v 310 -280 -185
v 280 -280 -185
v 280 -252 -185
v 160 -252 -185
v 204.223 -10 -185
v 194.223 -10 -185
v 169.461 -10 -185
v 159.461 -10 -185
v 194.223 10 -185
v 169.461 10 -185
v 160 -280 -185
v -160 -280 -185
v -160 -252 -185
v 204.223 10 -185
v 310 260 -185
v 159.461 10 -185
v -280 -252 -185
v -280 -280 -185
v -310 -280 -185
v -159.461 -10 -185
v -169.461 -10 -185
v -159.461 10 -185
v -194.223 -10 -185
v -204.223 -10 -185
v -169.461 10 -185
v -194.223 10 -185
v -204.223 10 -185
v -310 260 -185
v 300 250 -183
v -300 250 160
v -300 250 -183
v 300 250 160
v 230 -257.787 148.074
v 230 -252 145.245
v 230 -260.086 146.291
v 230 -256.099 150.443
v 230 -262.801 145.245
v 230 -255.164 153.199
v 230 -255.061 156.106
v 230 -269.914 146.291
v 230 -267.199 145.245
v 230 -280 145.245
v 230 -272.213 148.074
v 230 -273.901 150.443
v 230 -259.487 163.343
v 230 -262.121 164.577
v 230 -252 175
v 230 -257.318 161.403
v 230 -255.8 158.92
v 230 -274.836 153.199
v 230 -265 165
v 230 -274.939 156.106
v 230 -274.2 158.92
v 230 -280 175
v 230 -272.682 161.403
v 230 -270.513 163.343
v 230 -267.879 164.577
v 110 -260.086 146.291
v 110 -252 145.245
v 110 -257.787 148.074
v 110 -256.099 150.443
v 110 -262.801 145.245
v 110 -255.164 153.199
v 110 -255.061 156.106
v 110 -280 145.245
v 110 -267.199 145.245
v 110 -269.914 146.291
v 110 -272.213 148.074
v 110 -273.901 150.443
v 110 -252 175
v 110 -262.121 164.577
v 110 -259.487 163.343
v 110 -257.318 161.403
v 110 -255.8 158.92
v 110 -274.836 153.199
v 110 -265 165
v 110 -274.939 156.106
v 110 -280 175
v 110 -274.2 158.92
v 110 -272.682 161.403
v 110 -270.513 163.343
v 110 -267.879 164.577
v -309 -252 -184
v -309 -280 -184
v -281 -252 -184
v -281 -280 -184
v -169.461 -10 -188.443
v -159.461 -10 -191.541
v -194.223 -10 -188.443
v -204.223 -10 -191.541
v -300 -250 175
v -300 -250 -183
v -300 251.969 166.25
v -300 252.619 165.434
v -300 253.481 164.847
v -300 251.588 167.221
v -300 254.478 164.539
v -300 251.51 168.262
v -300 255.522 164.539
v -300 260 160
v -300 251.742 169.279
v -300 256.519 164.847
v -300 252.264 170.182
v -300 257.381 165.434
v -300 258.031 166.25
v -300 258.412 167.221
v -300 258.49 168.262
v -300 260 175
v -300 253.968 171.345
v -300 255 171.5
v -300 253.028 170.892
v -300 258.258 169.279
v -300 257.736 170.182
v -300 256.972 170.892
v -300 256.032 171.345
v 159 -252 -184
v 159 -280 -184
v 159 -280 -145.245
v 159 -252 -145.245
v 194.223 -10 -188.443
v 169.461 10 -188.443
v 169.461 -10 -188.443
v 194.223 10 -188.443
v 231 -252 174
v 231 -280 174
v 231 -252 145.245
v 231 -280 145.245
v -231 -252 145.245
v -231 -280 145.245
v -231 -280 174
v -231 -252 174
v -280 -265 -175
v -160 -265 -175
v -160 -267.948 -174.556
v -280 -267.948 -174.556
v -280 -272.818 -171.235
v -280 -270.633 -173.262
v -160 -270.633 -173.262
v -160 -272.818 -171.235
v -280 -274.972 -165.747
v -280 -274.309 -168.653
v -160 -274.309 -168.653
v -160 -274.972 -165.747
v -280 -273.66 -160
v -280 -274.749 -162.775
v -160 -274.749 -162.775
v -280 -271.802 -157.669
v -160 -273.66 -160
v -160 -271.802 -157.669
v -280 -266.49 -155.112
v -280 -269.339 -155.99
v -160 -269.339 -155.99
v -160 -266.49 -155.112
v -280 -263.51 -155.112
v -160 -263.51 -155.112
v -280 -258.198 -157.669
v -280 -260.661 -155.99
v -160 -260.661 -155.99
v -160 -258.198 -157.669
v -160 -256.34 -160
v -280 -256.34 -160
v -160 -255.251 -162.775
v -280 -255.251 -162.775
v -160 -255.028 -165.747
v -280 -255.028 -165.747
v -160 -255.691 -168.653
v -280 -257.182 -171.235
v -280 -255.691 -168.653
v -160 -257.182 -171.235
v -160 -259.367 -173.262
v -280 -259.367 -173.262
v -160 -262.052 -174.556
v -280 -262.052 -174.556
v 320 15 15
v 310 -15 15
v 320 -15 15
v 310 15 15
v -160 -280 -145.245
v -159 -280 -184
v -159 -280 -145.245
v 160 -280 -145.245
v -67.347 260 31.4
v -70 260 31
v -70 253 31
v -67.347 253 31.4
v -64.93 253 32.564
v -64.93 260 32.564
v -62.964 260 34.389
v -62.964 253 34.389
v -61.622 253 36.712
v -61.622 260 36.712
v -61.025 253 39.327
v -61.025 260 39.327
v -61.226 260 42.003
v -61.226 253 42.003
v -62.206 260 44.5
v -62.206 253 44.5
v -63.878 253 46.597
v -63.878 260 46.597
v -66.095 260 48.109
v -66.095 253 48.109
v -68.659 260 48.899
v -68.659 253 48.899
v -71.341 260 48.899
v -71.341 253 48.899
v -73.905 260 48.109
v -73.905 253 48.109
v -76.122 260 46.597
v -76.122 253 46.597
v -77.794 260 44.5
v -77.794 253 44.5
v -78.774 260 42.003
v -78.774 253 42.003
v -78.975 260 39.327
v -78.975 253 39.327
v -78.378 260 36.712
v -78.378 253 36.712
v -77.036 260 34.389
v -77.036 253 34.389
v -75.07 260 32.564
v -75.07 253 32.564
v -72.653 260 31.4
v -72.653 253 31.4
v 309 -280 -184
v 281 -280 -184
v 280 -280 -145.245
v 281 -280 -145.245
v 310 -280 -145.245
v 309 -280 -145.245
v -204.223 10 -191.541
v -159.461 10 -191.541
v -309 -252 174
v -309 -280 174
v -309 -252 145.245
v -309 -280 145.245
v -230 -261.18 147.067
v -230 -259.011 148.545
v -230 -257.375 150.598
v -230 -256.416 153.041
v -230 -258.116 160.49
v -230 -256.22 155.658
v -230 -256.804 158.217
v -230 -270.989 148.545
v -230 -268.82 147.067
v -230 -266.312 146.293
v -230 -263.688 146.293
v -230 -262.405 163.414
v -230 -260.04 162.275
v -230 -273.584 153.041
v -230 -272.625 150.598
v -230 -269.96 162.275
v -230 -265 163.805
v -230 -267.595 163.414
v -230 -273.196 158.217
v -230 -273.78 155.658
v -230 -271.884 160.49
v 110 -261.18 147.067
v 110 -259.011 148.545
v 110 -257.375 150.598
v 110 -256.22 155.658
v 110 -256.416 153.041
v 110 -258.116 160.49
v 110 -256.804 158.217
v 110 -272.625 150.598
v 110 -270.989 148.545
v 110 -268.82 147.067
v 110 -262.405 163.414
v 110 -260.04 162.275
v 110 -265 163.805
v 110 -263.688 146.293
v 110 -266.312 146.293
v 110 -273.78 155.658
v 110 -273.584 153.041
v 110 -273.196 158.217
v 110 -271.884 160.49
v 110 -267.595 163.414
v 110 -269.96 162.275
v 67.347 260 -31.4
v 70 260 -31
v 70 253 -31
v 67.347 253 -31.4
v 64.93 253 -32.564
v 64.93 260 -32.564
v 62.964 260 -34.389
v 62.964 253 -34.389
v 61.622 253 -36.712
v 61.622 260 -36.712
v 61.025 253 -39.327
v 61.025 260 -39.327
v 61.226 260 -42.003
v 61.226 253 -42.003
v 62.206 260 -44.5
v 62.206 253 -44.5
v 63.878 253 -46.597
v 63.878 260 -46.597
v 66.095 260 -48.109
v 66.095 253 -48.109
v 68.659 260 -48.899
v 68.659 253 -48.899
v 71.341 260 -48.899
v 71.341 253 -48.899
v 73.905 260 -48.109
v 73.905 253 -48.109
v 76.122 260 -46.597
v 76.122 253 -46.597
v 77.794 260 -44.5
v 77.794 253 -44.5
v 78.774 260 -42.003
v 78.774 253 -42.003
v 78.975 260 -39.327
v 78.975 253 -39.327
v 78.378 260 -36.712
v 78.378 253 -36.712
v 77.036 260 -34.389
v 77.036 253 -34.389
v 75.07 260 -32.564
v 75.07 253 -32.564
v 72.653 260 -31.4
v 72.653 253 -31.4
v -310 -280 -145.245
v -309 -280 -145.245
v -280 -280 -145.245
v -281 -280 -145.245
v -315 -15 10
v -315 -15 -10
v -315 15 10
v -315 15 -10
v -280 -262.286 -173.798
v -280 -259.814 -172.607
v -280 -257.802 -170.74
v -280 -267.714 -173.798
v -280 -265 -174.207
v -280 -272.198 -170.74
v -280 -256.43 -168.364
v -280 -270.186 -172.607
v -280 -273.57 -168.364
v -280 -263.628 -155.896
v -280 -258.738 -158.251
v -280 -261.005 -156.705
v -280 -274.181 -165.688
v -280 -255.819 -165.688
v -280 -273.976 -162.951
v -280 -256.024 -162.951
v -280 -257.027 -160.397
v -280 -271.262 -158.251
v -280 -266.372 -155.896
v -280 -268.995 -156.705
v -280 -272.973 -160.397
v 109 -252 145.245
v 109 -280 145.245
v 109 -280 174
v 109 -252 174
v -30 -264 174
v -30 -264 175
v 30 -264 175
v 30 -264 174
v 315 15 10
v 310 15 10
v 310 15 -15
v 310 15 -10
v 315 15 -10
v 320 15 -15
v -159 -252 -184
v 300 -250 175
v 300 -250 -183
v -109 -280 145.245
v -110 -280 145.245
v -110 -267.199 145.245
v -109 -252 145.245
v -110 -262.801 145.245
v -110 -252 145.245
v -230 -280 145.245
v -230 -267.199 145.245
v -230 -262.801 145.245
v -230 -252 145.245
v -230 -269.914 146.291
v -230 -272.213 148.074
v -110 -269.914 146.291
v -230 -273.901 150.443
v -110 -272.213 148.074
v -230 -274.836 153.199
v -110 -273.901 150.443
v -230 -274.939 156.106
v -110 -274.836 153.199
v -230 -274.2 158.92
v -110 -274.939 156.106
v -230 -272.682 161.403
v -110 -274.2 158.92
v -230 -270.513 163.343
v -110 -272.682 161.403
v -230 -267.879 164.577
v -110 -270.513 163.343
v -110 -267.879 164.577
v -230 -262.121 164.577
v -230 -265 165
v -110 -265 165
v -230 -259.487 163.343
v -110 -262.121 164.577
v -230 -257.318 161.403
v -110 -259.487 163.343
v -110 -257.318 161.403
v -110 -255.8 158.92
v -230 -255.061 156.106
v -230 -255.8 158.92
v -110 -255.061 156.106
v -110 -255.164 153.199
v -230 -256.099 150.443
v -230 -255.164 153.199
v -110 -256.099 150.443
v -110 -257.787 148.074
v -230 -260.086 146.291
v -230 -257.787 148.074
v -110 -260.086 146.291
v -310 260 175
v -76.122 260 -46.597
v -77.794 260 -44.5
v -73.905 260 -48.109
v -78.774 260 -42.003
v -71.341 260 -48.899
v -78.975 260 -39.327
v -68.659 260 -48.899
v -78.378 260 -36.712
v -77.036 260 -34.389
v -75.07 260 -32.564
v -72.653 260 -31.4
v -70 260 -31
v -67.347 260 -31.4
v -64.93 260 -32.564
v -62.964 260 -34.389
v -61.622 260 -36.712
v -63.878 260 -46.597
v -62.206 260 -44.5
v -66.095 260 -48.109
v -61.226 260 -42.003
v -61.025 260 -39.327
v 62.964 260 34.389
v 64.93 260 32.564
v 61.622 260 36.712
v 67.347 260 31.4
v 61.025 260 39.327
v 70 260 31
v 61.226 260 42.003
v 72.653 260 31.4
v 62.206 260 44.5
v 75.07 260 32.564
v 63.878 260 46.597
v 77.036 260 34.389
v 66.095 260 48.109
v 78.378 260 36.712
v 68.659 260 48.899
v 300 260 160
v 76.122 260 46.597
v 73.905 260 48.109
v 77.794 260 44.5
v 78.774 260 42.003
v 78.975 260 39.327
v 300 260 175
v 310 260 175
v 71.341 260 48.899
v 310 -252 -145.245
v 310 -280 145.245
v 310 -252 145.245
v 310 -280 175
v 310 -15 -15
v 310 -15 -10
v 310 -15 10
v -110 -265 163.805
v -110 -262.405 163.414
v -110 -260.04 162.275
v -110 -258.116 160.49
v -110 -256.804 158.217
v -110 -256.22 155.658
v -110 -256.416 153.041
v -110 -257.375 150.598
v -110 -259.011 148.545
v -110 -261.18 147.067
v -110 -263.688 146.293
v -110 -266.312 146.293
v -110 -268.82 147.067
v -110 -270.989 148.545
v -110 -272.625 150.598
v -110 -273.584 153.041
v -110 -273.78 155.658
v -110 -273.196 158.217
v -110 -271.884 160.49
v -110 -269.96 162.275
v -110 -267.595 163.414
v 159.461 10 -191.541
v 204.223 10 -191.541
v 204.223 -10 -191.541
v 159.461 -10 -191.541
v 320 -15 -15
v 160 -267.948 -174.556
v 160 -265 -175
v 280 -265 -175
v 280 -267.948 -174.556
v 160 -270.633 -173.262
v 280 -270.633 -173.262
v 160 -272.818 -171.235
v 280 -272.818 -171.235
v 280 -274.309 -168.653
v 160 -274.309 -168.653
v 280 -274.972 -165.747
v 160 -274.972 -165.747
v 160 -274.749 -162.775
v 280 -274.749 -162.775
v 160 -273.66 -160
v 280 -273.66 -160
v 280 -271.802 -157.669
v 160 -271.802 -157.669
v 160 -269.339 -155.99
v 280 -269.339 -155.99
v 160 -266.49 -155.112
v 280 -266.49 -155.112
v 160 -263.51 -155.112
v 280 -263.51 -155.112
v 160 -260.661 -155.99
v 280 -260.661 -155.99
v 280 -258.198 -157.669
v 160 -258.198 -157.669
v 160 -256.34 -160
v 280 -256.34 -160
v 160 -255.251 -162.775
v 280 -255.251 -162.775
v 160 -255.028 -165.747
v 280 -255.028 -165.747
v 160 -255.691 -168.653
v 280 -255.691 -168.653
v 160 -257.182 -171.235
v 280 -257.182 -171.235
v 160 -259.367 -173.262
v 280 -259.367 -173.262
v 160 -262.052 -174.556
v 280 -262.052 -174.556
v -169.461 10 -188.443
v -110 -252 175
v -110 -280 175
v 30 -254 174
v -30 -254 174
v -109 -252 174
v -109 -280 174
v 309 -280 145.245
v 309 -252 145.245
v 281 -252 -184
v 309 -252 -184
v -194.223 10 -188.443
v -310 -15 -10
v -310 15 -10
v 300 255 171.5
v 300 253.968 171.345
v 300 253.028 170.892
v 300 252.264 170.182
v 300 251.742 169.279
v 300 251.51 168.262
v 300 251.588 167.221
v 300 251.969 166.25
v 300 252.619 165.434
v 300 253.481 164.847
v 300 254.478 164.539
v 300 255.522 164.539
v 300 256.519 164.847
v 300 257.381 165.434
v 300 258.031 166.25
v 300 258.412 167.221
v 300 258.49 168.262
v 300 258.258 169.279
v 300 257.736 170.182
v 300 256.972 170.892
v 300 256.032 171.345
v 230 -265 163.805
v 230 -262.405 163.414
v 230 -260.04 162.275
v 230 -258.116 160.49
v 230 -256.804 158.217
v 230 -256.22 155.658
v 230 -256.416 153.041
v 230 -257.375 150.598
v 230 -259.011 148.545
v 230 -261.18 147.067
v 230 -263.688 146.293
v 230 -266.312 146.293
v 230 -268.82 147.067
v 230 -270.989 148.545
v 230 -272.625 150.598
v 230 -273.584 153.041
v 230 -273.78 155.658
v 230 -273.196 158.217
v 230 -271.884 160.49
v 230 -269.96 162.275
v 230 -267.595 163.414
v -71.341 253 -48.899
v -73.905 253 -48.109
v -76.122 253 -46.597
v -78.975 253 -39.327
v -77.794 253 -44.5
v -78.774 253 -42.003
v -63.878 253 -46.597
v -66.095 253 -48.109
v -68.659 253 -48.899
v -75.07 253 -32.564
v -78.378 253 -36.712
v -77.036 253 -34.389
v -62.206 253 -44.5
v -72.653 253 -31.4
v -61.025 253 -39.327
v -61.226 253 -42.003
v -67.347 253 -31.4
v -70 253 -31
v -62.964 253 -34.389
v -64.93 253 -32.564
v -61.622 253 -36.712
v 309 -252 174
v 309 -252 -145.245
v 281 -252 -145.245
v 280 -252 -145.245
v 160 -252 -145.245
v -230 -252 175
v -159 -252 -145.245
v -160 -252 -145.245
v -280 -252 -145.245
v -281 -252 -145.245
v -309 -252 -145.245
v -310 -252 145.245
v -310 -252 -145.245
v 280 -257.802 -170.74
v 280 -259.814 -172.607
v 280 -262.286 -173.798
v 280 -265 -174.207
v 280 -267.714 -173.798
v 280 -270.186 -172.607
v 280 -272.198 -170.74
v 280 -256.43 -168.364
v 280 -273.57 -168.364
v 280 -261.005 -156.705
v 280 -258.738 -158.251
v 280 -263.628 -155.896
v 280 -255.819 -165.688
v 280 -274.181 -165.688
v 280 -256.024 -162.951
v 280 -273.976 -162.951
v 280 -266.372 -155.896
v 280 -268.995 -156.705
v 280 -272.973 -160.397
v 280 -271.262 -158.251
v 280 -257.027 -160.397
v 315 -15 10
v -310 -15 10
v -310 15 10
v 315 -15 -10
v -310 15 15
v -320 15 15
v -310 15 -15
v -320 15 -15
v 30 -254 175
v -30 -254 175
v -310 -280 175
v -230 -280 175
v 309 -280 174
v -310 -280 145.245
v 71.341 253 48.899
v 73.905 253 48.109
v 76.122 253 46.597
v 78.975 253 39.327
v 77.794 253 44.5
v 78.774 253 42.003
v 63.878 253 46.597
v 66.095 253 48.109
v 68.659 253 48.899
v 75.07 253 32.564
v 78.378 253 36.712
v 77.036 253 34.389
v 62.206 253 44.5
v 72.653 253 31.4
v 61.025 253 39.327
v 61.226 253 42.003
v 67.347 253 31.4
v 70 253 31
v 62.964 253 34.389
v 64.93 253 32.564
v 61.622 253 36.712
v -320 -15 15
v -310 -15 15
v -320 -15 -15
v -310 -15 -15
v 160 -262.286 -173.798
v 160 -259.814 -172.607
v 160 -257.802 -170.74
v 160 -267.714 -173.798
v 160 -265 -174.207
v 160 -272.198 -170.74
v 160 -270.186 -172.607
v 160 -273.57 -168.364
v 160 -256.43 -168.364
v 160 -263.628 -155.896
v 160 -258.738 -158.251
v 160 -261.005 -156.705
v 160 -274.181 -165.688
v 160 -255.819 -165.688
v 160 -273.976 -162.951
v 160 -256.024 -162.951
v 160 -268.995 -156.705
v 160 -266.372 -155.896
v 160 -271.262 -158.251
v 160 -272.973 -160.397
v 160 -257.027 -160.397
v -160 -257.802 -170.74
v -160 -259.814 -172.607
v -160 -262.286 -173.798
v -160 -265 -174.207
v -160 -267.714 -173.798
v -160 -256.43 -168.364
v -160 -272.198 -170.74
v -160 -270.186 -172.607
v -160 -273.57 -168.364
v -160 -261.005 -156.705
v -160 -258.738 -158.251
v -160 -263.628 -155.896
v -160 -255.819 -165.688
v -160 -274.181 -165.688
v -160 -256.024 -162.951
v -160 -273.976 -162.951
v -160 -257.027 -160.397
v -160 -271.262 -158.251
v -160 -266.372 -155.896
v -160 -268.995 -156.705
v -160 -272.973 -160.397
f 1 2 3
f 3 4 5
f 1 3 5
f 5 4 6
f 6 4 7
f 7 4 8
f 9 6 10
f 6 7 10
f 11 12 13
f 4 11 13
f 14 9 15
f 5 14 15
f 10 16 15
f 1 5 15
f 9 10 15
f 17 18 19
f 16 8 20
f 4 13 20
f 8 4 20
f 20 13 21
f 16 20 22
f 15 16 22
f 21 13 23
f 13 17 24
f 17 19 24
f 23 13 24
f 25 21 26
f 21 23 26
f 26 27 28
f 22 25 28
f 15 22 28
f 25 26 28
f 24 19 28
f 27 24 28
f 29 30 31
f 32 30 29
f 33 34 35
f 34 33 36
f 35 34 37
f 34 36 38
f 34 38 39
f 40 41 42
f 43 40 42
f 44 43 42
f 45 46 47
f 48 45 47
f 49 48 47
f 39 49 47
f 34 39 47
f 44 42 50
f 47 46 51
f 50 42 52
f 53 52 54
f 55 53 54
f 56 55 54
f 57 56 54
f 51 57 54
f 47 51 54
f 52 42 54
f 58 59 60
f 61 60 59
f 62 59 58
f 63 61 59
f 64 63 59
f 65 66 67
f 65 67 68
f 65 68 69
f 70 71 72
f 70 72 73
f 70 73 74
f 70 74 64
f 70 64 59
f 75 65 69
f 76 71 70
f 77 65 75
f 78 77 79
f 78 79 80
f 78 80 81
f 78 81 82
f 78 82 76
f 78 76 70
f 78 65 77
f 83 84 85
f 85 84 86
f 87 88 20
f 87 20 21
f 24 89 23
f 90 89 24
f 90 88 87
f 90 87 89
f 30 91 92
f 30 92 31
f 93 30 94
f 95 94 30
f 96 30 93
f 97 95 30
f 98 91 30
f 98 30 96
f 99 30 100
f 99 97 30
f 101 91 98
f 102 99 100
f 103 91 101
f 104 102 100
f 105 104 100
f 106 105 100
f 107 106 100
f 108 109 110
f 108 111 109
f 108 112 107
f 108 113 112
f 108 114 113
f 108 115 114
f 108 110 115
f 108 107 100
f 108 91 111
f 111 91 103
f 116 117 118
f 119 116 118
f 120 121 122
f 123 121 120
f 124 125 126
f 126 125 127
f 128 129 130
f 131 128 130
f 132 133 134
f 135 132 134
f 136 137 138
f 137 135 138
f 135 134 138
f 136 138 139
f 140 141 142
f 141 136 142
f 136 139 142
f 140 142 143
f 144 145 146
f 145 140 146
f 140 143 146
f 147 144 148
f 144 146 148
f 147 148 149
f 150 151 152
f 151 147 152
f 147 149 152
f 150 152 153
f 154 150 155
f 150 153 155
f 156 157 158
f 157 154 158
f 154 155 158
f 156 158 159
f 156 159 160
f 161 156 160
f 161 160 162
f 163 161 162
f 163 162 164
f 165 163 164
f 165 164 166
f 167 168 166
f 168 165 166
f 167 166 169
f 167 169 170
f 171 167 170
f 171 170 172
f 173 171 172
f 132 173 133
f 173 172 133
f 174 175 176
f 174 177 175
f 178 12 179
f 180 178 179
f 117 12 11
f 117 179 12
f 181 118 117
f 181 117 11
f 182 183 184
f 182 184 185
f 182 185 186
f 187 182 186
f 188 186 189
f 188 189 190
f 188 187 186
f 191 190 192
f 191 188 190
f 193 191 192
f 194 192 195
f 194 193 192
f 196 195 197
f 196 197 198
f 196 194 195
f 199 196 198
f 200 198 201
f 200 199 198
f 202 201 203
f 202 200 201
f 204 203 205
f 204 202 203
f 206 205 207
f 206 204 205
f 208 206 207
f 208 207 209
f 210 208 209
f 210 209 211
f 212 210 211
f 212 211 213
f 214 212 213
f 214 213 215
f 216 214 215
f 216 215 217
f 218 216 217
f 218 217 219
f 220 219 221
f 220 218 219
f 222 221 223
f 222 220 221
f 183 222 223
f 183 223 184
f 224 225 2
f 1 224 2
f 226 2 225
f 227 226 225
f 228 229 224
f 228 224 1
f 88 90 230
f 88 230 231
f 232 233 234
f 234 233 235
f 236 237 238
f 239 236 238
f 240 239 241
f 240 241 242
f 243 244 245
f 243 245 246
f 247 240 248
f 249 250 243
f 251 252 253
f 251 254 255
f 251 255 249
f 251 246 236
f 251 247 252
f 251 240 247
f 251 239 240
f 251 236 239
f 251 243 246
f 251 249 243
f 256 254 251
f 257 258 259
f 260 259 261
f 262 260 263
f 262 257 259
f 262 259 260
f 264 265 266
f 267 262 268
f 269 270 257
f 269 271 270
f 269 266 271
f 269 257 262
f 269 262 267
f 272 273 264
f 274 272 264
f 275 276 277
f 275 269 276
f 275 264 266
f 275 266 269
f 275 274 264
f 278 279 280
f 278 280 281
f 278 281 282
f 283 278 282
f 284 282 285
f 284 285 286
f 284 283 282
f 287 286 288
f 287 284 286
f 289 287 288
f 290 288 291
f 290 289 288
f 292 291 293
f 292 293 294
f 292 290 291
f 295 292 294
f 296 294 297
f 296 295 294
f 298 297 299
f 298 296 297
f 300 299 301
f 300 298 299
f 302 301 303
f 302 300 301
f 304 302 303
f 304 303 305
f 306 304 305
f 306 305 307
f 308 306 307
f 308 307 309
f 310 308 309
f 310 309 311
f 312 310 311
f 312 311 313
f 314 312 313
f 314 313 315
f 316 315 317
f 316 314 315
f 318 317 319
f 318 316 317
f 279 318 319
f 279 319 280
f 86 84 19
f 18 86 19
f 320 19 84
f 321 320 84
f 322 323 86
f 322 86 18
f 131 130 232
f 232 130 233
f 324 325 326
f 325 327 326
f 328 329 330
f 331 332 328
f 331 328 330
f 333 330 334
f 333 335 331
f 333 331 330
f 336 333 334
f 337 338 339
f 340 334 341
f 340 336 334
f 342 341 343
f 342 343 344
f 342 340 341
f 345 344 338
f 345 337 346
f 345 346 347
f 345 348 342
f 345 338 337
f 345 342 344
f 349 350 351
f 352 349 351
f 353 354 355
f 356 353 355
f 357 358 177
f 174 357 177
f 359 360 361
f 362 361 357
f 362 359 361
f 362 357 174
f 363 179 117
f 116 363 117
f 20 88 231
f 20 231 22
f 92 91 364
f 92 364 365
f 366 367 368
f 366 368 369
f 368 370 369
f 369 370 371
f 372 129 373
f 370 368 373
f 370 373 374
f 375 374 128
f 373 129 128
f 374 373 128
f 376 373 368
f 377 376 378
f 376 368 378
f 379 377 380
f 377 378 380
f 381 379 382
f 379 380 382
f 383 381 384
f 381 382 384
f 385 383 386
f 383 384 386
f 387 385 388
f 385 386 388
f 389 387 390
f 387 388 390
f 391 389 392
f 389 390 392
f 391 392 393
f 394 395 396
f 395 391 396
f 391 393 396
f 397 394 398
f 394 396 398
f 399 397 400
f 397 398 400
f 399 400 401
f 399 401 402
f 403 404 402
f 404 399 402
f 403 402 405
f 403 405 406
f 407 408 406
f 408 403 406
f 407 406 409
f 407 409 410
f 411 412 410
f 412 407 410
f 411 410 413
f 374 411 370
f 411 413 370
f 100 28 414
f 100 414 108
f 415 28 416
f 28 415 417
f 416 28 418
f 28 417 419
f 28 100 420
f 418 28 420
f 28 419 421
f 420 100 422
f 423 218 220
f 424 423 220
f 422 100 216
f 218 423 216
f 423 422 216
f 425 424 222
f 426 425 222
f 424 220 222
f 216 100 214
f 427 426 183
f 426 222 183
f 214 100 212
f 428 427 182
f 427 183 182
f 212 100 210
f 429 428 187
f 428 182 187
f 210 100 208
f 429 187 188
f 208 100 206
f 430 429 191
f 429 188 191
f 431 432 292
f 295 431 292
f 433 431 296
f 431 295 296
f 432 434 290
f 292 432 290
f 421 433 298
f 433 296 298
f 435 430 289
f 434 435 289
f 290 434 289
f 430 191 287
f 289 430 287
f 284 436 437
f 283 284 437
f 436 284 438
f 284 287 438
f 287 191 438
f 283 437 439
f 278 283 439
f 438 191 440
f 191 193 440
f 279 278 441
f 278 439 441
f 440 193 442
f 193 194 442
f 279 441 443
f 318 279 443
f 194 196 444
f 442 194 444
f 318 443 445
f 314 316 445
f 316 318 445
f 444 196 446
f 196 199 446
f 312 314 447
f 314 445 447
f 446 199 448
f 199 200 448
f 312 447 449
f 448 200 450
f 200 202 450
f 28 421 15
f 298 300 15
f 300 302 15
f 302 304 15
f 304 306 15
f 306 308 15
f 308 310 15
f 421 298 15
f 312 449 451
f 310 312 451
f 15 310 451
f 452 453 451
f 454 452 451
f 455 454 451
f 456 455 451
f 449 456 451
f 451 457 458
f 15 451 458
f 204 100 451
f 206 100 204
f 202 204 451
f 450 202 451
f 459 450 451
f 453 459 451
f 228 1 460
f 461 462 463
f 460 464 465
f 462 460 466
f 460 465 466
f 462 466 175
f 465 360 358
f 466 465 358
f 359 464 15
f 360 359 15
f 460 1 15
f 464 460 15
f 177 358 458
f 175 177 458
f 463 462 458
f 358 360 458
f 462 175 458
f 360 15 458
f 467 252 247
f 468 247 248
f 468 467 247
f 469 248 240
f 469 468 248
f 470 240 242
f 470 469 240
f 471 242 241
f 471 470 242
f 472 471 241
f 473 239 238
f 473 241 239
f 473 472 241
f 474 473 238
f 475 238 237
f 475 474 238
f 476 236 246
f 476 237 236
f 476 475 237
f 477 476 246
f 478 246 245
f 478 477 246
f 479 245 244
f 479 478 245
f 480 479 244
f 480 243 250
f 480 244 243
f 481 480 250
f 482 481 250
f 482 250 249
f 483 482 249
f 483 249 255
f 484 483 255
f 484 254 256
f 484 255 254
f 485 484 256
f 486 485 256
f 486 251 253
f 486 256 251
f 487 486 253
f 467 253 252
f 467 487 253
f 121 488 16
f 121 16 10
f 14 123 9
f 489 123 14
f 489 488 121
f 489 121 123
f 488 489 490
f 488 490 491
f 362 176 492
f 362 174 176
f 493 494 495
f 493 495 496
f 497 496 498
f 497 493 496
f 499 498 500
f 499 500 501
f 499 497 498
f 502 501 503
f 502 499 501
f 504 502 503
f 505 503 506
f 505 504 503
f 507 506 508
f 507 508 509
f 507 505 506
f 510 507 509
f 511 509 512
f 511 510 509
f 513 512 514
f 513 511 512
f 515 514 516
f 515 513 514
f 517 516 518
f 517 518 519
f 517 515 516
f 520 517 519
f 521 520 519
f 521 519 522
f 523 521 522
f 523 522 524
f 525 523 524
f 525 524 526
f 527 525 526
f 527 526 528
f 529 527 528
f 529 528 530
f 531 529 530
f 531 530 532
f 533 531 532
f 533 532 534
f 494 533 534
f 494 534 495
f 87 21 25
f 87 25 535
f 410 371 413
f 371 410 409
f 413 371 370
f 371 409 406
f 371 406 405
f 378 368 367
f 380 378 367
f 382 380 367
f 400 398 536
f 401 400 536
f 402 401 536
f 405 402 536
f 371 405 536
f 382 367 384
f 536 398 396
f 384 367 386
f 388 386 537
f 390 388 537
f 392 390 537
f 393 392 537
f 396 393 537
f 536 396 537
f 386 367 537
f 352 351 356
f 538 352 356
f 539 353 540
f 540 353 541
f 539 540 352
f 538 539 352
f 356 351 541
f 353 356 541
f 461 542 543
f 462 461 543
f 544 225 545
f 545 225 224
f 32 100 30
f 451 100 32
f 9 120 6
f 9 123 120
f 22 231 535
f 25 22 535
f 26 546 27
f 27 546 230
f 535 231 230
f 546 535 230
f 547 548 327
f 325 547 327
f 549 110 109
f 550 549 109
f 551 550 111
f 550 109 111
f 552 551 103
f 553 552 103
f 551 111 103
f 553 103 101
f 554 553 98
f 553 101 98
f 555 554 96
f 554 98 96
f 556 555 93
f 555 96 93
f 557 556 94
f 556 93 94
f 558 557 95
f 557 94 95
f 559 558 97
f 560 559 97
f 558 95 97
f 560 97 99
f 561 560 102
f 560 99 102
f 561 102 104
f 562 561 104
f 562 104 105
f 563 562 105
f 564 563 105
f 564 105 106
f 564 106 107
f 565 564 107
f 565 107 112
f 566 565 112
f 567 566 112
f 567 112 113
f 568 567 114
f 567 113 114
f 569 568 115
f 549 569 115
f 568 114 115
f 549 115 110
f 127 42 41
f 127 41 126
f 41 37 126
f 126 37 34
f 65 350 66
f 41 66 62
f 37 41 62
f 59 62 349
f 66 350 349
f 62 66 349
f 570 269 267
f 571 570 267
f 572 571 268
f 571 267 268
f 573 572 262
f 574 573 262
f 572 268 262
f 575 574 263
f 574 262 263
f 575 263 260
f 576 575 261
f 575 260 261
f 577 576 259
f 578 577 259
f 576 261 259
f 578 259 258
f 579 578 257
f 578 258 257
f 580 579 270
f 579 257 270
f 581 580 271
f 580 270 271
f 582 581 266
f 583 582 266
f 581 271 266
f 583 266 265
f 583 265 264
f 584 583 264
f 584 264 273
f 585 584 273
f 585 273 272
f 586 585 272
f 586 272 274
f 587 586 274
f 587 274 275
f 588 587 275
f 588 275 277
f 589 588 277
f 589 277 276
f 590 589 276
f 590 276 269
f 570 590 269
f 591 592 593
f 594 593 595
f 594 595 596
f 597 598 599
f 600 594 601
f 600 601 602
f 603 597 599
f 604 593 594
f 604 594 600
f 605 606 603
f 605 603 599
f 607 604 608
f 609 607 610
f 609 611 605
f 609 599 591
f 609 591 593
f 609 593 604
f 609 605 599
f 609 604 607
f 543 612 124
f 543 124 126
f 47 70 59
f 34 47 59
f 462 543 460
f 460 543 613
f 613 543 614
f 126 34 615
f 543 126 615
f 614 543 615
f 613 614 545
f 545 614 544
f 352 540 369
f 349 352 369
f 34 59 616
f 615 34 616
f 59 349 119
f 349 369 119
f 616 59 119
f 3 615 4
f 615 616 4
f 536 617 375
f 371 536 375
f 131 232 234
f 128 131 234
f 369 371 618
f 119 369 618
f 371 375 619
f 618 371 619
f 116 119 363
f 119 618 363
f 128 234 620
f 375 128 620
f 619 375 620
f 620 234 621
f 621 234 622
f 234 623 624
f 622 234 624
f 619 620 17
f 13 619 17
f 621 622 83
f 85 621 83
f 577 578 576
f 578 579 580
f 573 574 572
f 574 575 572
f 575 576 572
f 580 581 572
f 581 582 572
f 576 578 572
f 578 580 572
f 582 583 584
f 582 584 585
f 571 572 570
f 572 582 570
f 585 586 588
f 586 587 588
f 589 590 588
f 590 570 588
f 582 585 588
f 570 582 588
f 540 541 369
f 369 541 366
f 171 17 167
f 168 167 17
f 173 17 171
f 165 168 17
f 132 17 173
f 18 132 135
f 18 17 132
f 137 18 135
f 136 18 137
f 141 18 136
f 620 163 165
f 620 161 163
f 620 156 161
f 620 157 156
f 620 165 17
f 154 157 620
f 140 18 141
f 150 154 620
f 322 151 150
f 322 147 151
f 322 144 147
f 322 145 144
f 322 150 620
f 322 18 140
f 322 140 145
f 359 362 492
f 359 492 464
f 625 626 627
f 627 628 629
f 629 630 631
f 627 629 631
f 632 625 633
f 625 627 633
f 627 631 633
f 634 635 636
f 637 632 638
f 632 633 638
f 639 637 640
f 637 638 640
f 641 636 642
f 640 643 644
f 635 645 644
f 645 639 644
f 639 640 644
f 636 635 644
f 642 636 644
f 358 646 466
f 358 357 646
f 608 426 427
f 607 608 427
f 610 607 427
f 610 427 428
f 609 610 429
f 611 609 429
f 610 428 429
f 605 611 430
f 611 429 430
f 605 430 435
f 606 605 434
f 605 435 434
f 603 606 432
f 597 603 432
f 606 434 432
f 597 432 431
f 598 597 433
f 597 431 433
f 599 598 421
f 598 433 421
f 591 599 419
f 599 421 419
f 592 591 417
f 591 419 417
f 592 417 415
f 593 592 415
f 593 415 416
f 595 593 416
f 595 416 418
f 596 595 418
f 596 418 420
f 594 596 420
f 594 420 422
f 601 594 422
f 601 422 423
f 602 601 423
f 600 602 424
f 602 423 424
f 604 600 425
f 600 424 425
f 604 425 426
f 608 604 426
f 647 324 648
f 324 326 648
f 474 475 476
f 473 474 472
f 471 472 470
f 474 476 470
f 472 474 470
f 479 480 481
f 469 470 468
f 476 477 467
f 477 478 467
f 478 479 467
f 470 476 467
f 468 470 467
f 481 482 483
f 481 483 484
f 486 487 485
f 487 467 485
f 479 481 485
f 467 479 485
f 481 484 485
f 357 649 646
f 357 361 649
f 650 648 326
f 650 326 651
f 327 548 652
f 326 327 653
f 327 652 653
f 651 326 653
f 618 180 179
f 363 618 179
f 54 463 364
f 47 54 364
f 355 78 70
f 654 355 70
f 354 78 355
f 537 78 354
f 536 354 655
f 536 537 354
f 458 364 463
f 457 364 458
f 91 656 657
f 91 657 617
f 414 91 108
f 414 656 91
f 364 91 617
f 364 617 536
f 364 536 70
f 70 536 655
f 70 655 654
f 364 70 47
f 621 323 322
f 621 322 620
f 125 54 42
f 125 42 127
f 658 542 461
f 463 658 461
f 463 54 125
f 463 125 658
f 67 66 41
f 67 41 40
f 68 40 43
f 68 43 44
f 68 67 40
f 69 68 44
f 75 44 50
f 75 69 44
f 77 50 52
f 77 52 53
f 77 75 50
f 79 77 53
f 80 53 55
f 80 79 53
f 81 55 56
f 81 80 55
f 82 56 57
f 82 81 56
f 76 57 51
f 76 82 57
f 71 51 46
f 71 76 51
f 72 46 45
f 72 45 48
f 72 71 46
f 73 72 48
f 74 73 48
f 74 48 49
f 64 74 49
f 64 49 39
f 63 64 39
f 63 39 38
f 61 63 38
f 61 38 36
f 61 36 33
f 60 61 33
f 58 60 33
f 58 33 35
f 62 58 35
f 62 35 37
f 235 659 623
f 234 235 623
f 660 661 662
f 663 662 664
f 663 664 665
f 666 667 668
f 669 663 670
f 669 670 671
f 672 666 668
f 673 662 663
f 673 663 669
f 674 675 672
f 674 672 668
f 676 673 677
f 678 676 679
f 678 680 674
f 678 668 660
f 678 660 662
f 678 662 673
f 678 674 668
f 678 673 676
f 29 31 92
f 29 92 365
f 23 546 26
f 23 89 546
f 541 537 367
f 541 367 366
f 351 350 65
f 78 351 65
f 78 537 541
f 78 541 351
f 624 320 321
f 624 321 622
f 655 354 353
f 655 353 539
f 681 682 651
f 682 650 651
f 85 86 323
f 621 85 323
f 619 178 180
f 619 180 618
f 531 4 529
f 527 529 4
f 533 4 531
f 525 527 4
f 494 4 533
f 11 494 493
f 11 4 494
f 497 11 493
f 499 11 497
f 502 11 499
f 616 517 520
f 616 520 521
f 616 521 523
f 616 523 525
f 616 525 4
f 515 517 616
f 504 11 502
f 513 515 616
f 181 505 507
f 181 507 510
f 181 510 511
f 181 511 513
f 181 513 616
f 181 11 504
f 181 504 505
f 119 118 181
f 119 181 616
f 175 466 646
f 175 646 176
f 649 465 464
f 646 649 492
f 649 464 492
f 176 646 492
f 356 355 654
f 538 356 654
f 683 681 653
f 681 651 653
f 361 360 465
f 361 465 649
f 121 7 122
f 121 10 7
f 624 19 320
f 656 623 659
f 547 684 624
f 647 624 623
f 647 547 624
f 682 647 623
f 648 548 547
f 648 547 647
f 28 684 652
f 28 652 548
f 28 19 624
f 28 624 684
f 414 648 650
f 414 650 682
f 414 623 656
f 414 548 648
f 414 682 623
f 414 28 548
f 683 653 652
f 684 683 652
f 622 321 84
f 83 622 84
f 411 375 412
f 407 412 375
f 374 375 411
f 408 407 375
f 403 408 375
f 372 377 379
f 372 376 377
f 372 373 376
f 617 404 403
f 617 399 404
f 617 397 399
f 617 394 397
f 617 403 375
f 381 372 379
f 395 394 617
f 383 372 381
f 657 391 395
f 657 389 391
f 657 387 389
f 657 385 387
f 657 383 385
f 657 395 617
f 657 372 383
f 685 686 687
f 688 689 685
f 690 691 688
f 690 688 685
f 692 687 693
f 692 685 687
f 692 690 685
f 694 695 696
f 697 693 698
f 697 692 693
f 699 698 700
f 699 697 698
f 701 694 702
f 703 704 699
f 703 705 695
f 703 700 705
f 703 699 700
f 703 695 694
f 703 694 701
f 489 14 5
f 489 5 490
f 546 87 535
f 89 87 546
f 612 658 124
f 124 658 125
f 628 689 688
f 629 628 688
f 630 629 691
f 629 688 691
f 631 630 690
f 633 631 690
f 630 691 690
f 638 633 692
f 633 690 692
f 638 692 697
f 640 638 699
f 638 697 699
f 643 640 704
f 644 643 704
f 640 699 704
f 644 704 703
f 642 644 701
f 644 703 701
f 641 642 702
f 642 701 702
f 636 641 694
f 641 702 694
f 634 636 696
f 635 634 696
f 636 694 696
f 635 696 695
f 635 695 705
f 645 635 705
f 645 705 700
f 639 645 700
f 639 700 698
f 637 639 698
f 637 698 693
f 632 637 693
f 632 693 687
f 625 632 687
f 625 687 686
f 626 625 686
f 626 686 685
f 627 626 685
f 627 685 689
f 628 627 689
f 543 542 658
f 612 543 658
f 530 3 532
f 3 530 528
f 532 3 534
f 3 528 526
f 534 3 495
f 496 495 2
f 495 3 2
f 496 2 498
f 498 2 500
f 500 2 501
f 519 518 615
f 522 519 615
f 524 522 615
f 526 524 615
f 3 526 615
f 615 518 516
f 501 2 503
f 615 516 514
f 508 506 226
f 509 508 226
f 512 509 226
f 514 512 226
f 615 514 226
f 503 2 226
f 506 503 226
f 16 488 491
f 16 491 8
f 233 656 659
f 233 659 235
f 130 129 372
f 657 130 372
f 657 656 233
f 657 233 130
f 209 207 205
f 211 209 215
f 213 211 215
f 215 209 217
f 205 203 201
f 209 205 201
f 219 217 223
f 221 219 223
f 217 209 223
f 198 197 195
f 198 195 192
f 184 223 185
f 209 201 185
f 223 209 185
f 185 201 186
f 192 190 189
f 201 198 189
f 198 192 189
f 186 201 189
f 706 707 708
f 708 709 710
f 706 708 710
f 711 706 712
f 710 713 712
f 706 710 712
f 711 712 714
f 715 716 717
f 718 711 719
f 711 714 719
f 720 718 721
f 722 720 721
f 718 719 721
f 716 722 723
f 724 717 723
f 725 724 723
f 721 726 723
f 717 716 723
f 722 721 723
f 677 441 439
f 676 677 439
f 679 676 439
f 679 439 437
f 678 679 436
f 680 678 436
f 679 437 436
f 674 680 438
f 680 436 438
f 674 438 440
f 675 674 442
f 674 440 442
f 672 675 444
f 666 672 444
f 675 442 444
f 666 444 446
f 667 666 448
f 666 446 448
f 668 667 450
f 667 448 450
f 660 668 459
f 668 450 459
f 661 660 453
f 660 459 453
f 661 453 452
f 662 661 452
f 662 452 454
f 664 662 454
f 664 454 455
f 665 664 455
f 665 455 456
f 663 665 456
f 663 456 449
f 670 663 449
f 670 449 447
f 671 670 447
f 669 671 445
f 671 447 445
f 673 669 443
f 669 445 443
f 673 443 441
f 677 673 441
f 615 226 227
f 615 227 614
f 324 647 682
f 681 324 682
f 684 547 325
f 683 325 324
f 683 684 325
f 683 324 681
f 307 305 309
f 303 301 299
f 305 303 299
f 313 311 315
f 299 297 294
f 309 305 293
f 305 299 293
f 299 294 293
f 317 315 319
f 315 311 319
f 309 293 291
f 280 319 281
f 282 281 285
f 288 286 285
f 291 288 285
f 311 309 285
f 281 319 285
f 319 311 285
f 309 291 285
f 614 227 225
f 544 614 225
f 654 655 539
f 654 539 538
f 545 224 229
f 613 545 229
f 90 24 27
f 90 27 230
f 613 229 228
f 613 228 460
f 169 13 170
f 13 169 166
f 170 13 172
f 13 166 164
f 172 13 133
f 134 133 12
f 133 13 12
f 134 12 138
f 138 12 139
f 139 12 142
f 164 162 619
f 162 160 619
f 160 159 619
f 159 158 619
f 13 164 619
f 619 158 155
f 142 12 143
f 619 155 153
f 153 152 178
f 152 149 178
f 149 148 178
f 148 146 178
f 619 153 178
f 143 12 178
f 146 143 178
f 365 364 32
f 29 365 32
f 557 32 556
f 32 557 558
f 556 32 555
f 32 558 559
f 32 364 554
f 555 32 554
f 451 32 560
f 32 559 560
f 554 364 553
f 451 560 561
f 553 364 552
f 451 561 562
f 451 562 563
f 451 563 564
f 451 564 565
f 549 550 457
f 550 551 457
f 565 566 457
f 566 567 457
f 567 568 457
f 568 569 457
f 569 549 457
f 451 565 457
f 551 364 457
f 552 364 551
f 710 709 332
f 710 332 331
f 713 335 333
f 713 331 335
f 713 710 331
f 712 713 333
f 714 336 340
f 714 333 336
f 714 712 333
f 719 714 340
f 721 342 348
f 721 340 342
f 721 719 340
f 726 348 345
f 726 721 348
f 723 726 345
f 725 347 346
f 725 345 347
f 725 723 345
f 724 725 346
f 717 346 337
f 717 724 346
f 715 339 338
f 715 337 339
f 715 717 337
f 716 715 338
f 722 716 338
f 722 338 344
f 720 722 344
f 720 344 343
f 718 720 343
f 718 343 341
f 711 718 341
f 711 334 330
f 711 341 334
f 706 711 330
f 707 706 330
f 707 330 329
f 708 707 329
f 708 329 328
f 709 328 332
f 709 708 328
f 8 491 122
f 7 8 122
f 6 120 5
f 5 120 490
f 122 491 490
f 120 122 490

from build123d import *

# Parameters (mm, degrees)
SKETCH1_W                                  = 600
SKETCH1_H                                  = 500
BOSS_EXTRUDE1_DEPTH                        = 175
SHELL1_T                                   = 10
SKETCH3_W                                  = 620
SKETCH3_H                                  = 360
BOSS_EXTRUDE2_DEPTH                        = 20
SKETCH5_W                                  = 120
SKETCH5_H                                  = 150
CUT_EXTRUDE1_DEPTH                         = 50
BOSS_EXTRUDE3_DEPTH                        = 15
SKETCH9_R                                  = 10
SKETCH9_R_2                                = 8.804977656
SKETCH9_R_3                                = 9.206937975
BOSS_EXTRUDE4_DEPTH                        = 180
BOSS_EXTRUDE8_START                        = -260
BOSS_EXTRUDE8_DEPTH                        = 10
SKETCH147_W                                = 600
SKETCH147_H                                = 15
CUT_EXTRUDE2_DEPTH                         = 10
SKETCH148_R                                = 3.5
BOSS_EXTRUDE10_DEPTH                       = 600
SKETCH149_R                                = 9
CUT_EXTRUDE3_DEPTH                         = 7
MIRROR3_AT_THE_SECOND_PLANE_COPY_1_SKETC_R = 9
MIRROR3_AT_THE_SECOND_PLANE_COPY_1_DEPTH   = 7
SKETCH150_W                                = 60
SKETCH150_H                                = 10
CUT_EXTRUDE4_DEPTH                         = 30
CUT_EXTRUDE10_DEPTH                        = 28
SKETCH155_W                                = 290.489530142
SKETCH155_H                                = 28
CUT_EXTRUDE11_DEPTH                        = 716.53321378
BOSS_EXTRUDE11_DEPTH                       = 488
BOSS_EXTRUDE12_DEPTH                       = 125
BOSS_EXTRUDE12_DEPTH_BACK                  = 445
SKETCH160_W                                = 600
SKETCH160_H                                = 500
CUT_EXTRUDE12_DEPTH                        = 8


with BuildPart() as part:
    # Sketch1 → Boss-Extrude1 (new, symmetric)
    with BuildSketch(Plane.XY):
        Rectangle(SKETCH1_W, SKETCH1_H)
    extrude(amount=BOSS_EXTRUDE1_DEPTH, both=True)

    # Shell1
    shell1_openings = [part.faces().sort_by_distance(p)[0] for p in [
        (0, 0, 175),
    ]]
    offset(amount=SHELL1_T, openings=shell1_openings, kind=Kind.INTERSECTION)

    # Sketch3 → Boss-Extrude2 (add)
    with BuildSketch(Plane.XZ.offset(260)):
        with Locations((0, -5)):
            Rectangle(SKETCH3_W, SKETCH3_H)
    extrude(amount=BOSS_EXTRUDE2_DEPTH)

    # Sketch5 → Cut-Extrude1 (cut)
    with BuildSketch(Plane.XZ.offset(280)):
        with Locations((-170, 100)):
            Rectangle(SKETCH5_W, SKETCH5_H)
        with Locations((170, 100)):
            Rectangle(SKETCH5_W, SKETCH5_H)
        with Locations((-220, -185)):
            Rectangle(SKETCH5_W, SKETCH5_H)
        with Locations((220, -185)):
            Rectangle(SKETCH5_W, SKETCH5_H)
    extrude(amount=-CUT_EXTRUDE1_DEPTH, mode=Mode.SUBTRACT)

    # Sketch8 → Boss-Extrude3 (add, symmetric)
    with BuildSketch(Plane(origin=(0, 0, 0), x_dir=(1, 0, 0), z_dir=(0, 1, 0))):
        Polygon((-310, 10), (-315, 10), (-315, -10), (-310, -10), (-310, -15), (-320, -15), (-320, 15), (-310, 15), align=None)
    boss_extrude3 = extrude(amount=BOSS_EXTRUDE3_DEPTH, both=True)

    # Sketch9 → Boss-Extrude4 (add)
    # profile 1 of 2: a face of its own
    with BuildSketch(Plane.ZY.offset(110)):
        with Locations(Location((155, -265, 0), (0, 0, 180))):
            Circle(SKETCH9_R)
        with Locations((155, -265)):
            Circle(SKETCH9_R_2, mode=Mode.SUBTRACT)
    # profile 2 of 2: a face of its own
    with BuildSketch(Plane.ZY.offset(110)):
        with Locations(Location((-165, -265, 0), (0, 0, 180))):
            Circle(SKETCH9_R)
        with Locations(Location((-165, -265, 0), (0, 0, 180))):
            Circle(SKETCH9_R_3, mode=Mode.SUBTRACT)
    boss_extrude4 = extrude(amount=BOSS_EXTRUDE4_DEPTH)

    # Mirror1: Boss-Extrude3, Boss-Extrude4 across plane
    add(boss_extrude3.mirror(Plane(origin=(0, 0, 0), x_dir=(0, 0, 1), z_dir=(1, 0, 0))))
    add(boss_extrude4.mirror(Plane(origin=(0, 0, 0), x_dir=(0, 0, 1), z_dir=(1, 0, 0))))

    # Sketch17 → Boss-Extrude8 (add, symmetric)
    with BuildSketch(Plane(origin=(0, 260, 0), x_dir=(1, 0, 0), z_dir=(0, 1, 0)).offset(BOSS_EXTRUDE8_START)):
        Polygon((-194.223256177, 185), (-204.223256177, 185), (-204.223256177, 191.540544069), (-159.461030104, 191.540544069), (-159.461030104, 185), (-169.461030104, 185), (-169.461030104, 188.442858537), (-194.223256177, 188.442858537), align=None)
        Polygon((194.223256177, 188.442858537), (194.223256177, 185), (204.223256177, 185), (204.223256177, 191.540544069), (159.461030104, 191.540544069), (159.461030104, 185), (169.461030104, 185), (169.461030104, 188.442858537), align=None)
    extrude(amount=BOSS_EXTRUDE8_DEPTH, both=True)

    # Sketch147 → Cut-Extrude2 (cut)
    with BuildSketch(Plane(origin=(0, 260, 0), x_dir=(1, 0, 0), z_dir=(0, 1, 0))):
        with Locations((0, -167.5)):
            Rectangle(SKETCH147_W, SKETCH147_H)
    extrude(amount=-CUT_EXTRUDE2_DEPTH, mode=Mode.SUBTRACT)

    # Sketch148 → Boss-Extrude10 (add)
    with BuildSketch(Plane(origin=(-300, 0, 0), x_dir=(0, 0, -1), z_dir=(1, 0, 0))):
        with Locations(Location((-168, 255, 0), (0, 0, 180))):
            Circle(SKETCH148_R)
    extrude(amount=BOSS_EXTRUDE10_DEPTH)

    # Sketch149 → Cut-Extrude3 (cut)
    with BuildSketch(Plane(origin=(0, 260, 0), x_dir=(1, 0, 0), z_dir=(0, 1, 0))):
        with Locations(Location((-70, 40, 0), (0, 0, 270))):
            Circle(SKETCH149_R)
    cut_extrude3 = extrude(amount=-CUT_EXTRUDE3_DEPTH, mode=Mode.SUBTRACT)

    # Mirror3: Cut-Extrude3 across plane
    add(cut_extrude3.mirror(Plane.XY), mode=Mode.SUBTRACT)

    # Mirror3 at the second plane: Cut-Extrude3 across plane
    add(cut_extrude3.mirror(Plane(origin=(0, 0, 0), x_dir=(0, 0, 1), z_dir=(1, 0, 0))), mode=Mode.SUBTRACT)

    # Mirror3 at the second plane copy 1 sketc → Mirror3 at the second plane copy 1 (cut)
    with BuildSketch(Plane(origin=(0, 260, 0), x_dir=(-1, 0, 0), z_dir=(0, 1, 0))):
        with Locations(Location((-70, 40, 0), (0, 0, 270))):
            Circle(MIRROR3_AT_THE_SECOND_PLANE_COPY_1_SKETC_R)
    extrude(amount=-MIRROR3_AT_THE_SECOND_PLANE_COPY_1_DEPTH, mode=Mode.SUBTRACT)

    # Sketch150 → Cut-Extrude4 (cut)
    with BuildSketch(Plane.XY.offset(175)):
        with Locations((0, -259)):
            Rectangle(SKETCH150_W, SKETCH150_H)
    extrude(amount=-CUT_EXTRUDE4_DEPTH, mode=Mode.SUBTRACT)

    # Sketch154 → Cut-Extrude10 (cut)
    with BuildSketch(Plane.XZ.offset(280)):
        Polygon((309, -184), (309, 174), (231, 174), (231, 24), (109, 24), (109, 174), (-109, 174), (-109, 24), (-231, 24), (-231, 174), (-309, 174), (-309, -184), (-281, -184), (-281, -109), (-159, -109), (-159, -184), (159, -184), (159, -109), (281, -109), (281, -184), align=None)
    extrude(amount=-CUT_EXTRUDE10_DEPTH, mode=Mode.SUBTRACT)

    # Sketch155 → Cut-Extrude11 (cut, through all)
    with BuildSketch(Plane.ZY.offset(310)):
        with Locations((0, -266)):
            Rectangle(SKETCH155_W, SKETCH155_H)
    extrude(amount=-CUT_EXTRUDE11_DEPTH, mode=Mode.SUBTRACT)

    # Sketch157 → Boss-Extrude11 (add)
    with BuildSketch(Plane(origin=(-230, 0, 0), x_dir=(0, 0, -1), z_dir=(1, 0, 0))):
        Polygon((-145.244765071, -252), (-175, -252), (-175, -250), (-25, -250), (-25, -252), align=None)
    extrude(amount=BOSS_EXTRUDE11_DEPTH)

    # Sketch159 → Boss-Extrude12 (add, two sides: drawn at the far end of the back side and taken through both)
    with BuildSketch(Plane(origin=(160, 0, 0), x_dir=(0, 0, -1), z_dir=(1, 0, 0)).offset(-BOSS_EXTRUDE12_DEPTH_BACK)):
        Polygon((145.244765071, -252), (185, -252), (185, -230), (175, -230), (175, -250), (110, -250), (110, -252), align=None)
    extrude(amount=BOSS_EXTRUDE12_DEPTH + BOSS_EXTRUDE12_DEPTH_BACK)

    # Sketch160 → Cut-Extrude12 (cut)
    with BuildSketch(Plane.XY.offset(-175)):
        Rectangle(SKETCH160_W, SKETCH160_H)
    extrude(amount=-CUT_EXTRUDE12_DEPTH, mode=Mode.SUBTRACT)


solid = part.part
